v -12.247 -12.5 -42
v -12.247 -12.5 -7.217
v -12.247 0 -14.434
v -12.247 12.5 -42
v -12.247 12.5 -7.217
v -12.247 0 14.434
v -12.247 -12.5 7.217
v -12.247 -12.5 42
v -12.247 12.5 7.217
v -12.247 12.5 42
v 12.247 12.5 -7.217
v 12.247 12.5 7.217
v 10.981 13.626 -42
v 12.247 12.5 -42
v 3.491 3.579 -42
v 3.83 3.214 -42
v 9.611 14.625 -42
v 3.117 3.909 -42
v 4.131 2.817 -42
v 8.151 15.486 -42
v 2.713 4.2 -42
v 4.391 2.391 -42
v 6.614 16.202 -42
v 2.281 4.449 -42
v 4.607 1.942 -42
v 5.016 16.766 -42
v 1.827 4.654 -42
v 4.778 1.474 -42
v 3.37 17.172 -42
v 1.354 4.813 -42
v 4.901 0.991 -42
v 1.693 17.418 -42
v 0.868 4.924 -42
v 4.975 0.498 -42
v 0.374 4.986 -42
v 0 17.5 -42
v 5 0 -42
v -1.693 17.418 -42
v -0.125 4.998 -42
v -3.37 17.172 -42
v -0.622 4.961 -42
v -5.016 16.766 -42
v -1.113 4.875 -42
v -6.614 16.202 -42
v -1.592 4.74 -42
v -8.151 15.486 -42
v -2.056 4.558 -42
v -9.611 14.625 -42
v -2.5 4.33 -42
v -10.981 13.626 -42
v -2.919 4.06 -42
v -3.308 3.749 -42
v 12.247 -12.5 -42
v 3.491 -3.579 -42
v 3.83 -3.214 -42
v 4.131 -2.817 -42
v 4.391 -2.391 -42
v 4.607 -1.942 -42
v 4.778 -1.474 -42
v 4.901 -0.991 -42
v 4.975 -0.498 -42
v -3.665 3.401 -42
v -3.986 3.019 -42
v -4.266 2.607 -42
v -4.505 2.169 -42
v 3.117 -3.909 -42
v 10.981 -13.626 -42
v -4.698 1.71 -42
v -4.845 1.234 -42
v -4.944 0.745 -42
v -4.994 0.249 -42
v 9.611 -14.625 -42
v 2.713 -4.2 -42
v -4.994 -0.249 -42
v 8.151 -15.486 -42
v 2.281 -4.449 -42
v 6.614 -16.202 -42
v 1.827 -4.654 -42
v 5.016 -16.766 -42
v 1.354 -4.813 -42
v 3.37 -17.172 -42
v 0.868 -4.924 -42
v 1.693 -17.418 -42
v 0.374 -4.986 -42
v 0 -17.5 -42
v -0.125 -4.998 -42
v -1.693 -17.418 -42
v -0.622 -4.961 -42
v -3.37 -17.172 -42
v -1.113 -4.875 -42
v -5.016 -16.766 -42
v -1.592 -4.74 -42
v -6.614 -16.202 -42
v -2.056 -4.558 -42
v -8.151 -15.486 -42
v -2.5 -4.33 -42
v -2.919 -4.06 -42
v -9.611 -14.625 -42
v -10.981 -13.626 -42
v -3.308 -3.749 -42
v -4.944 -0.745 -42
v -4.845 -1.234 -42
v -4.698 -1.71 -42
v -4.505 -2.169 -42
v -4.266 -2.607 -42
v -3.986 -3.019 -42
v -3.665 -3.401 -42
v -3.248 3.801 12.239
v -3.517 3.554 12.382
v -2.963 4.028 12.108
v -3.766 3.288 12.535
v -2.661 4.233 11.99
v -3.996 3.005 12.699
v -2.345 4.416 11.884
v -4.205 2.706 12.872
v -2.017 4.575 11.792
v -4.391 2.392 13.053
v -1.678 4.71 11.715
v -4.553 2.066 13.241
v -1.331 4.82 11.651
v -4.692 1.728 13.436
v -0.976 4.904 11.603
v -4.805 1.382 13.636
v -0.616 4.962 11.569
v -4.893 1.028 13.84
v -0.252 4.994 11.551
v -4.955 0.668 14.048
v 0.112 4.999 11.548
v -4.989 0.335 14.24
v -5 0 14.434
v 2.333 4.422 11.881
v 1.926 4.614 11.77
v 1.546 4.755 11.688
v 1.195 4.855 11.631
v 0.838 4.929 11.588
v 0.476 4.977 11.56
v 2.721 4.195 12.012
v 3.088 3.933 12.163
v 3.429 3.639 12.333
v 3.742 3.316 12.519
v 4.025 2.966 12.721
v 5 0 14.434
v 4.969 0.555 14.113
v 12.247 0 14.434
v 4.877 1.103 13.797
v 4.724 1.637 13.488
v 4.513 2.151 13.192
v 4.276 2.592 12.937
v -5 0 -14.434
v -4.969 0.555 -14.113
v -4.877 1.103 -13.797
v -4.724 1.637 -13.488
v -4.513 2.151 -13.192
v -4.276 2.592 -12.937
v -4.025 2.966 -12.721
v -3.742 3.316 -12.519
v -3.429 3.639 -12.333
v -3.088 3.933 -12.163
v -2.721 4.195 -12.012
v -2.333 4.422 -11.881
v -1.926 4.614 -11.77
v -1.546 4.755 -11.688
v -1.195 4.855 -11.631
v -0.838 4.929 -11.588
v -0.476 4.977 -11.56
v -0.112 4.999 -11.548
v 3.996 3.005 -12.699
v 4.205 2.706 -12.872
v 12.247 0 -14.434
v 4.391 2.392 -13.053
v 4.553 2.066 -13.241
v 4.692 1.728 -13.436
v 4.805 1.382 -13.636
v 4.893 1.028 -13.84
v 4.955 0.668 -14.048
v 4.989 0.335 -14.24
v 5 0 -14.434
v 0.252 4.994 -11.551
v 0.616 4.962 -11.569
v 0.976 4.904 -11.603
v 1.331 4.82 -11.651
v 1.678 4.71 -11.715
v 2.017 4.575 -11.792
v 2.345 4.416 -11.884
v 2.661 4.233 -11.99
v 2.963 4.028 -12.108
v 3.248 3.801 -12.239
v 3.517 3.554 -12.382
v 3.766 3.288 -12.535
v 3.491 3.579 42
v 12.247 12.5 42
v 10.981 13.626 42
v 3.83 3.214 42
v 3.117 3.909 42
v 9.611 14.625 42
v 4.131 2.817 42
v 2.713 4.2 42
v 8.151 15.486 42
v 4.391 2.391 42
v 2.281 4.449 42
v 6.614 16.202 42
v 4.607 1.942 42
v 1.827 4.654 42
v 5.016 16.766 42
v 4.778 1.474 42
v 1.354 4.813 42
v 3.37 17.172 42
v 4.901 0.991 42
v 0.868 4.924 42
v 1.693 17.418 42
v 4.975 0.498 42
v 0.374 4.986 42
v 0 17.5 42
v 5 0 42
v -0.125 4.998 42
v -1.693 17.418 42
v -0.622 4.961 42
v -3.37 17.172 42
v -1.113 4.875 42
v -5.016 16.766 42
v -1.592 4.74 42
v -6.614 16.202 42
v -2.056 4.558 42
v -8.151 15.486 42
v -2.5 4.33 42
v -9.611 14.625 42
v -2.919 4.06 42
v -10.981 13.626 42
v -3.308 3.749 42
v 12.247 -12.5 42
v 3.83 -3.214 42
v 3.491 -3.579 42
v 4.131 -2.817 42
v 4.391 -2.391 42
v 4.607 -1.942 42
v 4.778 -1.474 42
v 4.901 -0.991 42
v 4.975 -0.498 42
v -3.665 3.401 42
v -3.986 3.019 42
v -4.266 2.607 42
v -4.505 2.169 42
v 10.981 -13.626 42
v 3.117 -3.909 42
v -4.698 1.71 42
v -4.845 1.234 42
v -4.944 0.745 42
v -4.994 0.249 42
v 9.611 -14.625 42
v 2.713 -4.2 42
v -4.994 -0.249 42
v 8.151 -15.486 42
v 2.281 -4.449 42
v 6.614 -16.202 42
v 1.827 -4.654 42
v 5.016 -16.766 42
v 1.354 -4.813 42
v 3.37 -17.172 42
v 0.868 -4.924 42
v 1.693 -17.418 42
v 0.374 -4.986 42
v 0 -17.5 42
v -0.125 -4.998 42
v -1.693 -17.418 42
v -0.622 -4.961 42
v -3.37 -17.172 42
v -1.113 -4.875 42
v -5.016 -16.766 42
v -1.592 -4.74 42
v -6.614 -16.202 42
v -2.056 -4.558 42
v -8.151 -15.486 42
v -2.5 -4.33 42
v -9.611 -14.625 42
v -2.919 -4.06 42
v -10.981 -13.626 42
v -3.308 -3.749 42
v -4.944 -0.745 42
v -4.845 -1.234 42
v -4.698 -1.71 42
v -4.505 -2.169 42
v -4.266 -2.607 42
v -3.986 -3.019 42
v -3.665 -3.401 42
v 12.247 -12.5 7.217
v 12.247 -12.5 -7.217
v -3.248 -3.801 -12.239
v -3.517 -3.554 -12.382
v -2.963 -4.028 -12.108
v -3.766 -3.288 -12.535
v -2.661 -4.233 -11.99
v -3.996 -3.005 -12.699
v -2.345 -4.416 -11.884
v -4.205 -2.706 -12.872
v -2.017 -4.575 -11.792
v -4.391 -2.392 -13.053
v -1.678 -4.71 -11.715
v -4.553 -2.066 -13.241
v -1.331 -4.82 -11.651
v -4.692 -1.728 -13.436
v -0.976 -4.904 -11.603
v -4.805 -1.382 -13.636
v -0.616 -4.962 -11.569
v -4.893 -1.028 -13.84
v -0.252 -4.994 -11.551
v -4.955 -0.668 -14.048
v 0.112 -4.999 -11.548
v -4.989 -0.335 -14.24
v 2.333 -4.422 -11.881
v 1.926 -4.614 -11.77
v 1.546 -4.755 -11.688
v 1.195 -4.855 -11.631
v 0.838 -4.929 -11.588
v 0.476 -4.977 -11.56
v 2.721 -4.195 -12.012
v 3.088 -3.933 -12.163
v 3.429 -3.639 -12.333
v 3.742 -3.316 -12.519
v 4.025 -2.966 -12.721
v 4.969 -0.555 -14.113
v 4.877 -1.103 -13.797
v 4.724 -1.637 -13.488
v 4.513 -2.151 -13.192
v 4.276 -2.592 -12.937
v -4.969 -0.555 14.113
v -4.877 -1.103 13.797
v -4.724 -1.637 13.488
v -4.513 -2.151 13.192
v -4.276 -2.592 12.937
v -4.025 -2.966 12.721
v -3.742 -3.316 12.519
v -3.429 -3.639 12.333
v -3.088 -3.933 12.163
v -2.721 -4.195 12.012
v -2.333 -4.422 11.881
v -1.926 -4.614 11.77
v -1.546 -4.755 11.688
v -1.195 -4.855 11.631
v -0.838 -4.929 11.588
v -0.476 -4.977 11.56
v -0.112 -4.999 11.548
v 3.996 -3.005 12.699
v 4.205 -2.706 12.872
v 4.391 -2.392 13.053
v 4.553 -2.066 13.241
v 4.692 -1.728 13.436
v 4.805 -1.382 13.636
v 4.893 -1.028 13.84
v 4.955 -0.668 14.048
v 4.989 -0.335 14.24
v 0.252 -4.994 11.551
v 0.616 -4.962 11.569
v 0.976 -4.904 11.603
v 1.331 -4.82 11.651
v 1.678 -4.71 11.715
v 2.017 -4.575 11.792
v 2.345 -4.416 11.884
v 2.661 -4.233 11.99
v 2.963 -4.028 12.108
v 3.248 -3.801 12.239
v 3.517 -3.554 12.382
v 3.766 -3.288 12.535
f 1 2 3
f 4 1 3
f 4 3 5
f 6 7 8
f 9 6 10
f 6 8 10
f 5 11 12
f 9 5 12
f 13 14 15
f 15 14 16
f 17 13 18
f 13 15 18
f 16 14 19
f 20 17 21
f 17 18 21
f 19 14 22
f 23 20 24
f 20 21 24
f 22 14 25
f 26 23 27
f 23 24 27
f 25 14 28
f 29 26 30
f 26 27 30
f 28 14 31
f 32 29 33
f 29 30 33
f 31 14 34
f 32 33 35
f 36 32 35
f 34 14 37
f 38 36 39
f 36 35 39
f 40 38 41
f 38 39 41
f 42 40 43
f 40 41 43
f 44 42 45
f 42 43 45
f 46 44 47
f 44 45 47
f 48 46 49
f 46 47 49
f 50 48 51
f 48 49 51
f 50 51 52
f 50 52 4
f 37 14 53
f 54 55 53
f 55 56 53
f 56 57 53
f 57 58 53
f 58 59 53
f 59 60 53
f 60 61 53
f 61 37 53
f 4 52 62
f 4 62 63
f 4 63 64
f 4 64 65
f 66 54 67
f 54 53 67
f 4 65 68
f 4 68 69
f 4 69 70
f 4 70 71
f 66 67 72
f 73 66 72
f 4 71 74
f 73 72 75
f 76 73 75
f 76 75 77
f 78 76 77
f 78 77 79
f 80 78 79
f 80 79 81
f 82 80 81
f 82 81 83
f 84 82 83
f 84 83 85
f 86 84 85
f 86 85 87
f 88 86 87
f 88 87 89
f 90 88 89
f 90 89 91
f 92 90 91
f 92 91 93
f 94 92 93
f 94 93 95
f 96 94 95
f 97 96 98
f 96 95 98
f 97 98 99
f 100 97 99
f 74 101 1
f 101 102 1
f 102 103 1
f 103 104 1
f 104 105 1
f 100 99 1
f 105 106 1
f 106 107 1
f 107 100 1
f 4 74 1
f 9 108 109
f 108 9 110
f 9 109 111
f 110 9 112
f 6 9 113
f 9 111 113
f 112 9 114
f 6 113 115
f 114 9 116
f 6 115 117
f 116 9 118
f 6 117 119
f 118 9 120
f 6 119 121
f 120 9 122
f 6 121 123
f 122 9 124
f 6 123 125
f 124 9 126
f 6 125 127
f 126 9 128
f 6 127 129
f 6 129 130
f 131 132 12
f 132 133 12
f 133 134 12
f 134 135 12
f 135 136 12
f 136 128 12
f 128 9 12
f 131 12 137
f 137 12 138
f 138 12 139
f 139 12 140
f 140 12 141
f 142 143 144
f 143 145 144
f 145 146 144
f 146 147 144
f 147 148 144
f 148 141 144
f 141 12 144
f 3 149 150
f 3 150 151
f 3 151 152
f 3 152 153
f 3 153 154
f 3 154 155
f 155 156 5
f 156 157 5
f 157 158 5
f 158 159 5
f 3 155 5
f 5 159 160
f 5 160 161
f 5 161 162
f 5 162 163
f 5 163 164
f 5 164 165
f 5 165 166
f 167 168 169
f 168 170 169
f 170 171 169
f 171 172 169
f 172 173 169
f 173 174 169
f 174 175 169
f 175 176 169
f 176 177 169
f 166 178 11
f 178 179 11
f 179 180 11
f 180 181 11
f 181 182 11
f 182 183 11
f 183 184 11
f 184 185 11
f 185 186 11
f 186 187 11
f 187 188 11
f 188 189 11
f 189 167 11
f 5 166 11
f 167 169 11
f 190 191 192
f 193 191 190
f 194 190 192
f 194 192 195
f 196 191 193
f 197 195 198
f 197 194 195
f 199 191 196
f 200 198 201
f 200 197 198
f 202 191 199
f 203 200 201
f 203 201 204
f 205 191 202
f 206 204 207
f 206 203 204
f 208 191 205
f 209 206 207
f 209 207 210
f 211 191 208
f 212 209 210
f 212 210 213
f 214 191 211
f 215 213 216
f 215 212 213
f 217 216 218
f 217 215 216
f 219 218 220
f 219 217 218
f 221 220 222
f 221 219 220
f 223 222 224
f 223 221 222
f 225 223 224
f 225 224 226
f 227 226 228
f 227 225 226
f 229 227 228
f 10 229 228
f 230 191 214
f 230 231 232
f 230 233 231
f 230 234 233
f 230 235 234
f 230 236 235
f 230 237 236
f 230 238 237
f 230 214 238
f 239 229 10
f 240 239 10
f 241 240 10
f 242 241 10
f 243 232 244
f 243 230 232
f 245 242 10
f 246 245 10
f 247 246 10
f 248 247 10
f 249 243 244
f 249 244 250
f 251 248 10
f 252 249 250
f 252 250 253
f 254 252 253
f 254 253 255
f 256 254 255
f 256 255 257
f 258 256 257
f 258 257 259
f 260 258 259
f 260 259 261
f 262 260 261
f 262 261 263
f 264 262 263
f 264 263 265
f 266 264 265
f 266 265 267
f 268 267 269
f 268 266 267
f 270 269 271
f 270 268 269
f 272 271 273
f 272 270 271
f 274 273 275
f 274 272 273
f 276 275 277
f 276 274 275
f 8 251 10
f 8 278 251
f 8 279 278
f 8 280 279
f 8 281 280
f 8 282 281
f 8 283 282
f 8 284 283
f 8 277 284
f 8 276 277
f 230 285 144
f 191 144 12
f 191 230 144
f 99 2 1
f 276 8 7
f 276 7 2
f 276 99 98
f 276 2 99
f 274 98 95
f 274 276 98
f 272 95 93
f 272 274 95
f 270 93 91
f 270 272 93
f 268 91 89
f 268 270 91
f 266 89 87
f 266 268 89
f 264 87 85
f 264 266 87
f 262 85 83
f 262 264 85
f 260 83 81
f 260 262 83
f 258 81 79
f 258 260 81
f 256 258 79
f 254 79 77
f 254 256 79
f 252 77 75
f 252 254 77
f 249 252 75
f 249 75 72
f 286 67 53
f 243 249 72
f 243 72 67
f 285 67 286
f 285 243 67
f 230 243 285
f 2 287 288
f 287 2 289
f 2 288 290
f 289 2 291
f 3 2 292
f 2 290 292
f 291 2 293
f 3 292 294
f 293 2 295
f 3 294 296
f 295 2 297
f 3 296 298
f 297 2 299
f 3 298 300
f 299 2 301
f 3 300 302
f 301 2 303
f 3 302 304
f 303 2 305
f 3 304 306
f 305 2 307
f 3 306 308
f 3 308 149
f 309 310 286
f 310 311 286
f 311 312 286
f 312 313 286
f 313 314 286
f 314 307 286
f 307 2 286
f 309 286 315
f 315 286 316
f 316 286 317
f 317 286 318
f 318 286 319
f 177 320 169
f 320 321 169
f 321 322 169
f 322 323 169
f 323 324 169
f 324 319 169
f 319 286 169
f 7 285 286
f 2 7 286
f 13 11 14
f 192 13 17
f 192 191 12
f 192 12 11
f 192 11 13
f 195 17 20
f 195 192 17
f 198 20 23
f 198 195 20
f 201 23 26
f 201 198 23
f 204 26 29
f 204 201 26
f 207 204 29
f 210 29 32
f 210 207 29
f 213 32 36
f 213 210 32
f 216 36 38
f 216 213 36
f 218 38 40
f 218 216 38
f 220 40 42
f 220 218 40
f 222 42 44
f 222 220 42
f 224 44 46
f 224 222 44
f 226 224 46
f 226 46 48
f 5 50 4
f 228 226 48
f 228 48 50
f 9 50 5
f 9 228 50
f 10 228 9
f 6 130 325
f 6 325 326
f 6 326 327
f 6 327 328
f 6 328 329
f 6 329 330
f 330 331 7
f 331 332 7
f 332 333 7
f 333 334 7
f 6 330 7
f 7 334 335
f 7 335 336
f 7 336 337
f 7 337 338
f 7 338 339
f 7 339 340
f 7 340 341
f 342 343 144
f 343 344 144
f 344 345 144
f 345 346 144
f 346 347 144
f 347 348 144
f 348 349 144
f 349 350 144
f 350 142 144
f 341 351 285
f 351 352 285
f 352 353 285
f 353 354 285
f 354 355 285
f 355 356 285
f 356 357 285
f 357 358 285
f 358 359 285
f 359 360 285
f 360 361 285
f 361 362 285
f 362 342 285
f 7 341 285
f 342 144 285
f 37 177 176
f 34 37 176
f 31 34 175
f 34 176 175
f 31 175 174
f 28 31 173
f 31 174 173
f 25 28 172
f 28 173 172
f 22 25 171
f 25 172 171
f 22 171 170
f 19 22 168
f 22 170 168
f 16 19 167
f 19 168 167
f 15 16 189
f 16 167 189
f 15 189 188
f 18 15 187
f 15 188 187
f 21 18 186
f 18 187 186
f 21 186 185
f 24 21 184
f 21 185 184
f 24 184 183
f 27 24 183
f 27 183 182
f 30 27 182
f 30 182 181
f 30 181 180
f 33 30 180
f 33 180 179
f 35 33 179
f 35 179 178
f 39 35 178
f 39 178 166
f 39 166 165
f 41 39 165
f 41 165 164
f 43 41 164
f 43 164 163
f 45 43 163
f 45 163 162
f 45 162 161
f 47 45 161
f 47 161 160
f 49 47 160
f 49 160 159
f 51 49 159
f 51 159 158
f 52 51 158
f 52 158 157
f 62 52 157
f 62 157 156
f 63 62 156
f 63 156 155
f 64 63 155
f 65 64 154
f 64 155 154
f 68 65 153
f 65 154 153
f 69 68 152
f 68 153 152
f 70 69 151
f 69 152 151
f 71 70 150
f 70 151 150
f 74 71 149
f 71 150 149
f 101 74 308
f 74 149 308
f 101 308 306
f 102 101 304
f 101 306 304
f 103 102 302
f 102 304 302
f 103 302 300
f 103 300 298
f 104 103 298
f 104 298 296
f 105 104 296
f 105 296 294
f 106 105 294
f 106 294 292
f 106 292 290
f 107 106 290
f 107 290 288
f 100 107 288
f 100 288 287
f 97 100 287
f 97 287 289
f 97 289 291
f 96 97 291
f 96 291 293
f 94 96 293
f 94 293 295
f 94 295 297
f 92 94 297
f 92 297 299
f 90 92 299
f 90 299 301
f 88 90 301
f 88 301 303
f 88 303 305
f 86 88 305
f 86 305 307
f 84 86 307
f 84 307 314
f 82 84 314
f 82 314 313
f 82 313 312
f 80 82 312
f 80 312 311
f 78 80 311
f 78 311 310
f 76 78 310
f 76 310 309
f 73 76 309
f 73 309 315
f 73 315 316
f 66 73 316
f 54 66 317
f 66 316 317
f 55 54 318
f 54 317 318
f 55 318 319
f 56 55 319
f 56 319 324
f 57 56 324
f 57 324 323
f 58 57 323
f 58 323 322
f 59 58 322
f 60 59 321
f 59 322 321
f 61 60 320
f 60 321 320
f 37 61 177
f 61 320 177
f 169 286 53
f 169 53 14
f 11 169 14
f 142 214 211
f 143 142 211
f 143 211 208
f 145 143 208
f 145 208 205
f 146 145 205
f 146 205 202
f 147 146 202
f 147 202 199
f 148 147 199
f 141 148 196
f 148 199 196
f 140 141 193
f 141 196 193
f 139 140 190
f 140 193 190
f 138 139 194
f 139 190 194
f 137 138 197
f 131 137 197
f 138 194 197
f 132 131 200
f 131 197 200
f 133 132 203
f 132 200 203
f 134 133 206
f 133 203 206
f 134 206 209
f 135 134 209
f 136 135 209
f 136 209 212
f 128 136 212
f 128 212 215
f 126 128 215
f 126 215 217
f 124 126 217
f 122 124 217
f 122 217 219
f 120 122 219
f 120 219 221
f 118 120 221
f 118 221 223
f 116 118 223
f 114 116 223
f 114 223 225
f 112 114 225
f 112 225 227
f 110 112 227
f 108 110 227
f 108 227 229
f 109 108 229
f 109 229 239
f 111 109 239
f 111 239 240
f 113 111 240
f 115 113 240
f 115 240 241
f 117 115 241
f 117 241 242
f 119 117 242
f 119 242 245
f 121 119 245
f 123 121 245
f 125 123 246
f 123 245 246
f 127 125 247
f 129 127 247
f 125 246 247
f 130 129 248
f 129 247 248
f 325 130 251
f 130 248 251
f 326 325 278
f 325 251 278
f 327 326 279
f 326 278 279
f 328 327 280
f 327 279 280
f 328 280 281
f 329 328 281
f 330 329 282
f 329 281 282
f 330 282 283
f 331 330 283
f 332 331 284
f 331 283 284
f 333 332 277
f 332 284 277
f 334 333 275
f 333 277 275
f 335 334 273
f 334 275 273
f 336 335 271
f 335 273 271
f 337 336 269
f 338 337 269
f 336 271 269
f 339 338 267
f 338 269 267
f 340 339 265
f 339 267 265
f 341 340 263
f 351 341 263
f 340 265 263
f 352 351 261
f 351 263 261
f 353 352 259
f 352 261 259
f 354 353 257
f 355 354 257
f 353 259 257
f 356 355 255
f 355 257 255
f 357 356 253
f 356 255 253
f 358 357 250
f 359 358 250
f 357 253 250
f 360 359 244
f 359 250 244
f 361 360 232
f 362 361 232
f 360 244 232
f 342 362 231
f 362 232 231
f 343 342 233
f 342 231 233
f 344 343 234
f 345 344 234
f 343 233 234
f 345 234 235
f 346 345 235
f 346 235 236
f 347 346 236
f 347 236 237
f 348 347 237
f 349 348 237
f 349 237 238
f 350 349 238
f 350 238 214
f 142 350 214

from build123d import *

# Parameters (mm, degrees)
SKETCH1_R           = 17.5
BOSS_EXTRUDE1_DEPTH = 42
SKETCH3_W           = 21.176447949
SKETCH3_H           = 25
CUT_EXTRUDE1_DEPTH  = 88.569972022
SKETCH4_R           = 5
CUT_EXTRUDE2_DEPTH  = 87.67323693
CUT_EXTRUDE3_DEPTH  = 74


with BuildPart() as part:
    # Sketch1 → Boss-Extrude1 (new, symmetric)
    with BuildSketch(Plane.XY):
        with Locations(Location((0, 0, 0), (0, 0, 180))):
            Circle(SKETCH1_R)
    extrude(amount=BOSS_EXTRUDE1_DEPTH, both=True)

    # Sketch3 → Cut-Extrude1 (cut, through all)
    with BuildSketch(Plane.XY.offset(42)):
        with Locations((-22.835672689, 0)):
            Rectangle(SKETCH3_W, SKETCH3_H)
        with Locations((22.835672689, 0)):
            Rectangle(SKETCH3_W, SKETCH3_H)
    extrude(amount=-CUT_EXTRUDE1_DEPTH, mode=Mode.SUBTRACT)

    # Sketch4 → Cut-Extrude2 (cut, through all)
    with BuildSketch(Plane.XY.offset(42)):
        Circle(SKETCH4_R)
    extrude(amount=-CUT_EXTRUDE2_DEPTH, mode=Mode.SUBTRACT)

    # Sketch5 → Cut-Extrude3 (cut)
    with BuildSketch(Plane(origin=(12.247448714, 0, 0), x_dir=(0, 0, -1), z_dir=(1, 0, 0))):
        Polygon((14.43375673, 0), (7.216878365, 12.5), (-7.216878365, 12.5), (-14.43375673, 0), (-7.216878365, -12.5), (7.216878365, -12.5), align=None)
    extrude(amount=-CUT_EXTRUDE3_DEPTH, mode=Mode.SUBTRACT)


solid = part.part
